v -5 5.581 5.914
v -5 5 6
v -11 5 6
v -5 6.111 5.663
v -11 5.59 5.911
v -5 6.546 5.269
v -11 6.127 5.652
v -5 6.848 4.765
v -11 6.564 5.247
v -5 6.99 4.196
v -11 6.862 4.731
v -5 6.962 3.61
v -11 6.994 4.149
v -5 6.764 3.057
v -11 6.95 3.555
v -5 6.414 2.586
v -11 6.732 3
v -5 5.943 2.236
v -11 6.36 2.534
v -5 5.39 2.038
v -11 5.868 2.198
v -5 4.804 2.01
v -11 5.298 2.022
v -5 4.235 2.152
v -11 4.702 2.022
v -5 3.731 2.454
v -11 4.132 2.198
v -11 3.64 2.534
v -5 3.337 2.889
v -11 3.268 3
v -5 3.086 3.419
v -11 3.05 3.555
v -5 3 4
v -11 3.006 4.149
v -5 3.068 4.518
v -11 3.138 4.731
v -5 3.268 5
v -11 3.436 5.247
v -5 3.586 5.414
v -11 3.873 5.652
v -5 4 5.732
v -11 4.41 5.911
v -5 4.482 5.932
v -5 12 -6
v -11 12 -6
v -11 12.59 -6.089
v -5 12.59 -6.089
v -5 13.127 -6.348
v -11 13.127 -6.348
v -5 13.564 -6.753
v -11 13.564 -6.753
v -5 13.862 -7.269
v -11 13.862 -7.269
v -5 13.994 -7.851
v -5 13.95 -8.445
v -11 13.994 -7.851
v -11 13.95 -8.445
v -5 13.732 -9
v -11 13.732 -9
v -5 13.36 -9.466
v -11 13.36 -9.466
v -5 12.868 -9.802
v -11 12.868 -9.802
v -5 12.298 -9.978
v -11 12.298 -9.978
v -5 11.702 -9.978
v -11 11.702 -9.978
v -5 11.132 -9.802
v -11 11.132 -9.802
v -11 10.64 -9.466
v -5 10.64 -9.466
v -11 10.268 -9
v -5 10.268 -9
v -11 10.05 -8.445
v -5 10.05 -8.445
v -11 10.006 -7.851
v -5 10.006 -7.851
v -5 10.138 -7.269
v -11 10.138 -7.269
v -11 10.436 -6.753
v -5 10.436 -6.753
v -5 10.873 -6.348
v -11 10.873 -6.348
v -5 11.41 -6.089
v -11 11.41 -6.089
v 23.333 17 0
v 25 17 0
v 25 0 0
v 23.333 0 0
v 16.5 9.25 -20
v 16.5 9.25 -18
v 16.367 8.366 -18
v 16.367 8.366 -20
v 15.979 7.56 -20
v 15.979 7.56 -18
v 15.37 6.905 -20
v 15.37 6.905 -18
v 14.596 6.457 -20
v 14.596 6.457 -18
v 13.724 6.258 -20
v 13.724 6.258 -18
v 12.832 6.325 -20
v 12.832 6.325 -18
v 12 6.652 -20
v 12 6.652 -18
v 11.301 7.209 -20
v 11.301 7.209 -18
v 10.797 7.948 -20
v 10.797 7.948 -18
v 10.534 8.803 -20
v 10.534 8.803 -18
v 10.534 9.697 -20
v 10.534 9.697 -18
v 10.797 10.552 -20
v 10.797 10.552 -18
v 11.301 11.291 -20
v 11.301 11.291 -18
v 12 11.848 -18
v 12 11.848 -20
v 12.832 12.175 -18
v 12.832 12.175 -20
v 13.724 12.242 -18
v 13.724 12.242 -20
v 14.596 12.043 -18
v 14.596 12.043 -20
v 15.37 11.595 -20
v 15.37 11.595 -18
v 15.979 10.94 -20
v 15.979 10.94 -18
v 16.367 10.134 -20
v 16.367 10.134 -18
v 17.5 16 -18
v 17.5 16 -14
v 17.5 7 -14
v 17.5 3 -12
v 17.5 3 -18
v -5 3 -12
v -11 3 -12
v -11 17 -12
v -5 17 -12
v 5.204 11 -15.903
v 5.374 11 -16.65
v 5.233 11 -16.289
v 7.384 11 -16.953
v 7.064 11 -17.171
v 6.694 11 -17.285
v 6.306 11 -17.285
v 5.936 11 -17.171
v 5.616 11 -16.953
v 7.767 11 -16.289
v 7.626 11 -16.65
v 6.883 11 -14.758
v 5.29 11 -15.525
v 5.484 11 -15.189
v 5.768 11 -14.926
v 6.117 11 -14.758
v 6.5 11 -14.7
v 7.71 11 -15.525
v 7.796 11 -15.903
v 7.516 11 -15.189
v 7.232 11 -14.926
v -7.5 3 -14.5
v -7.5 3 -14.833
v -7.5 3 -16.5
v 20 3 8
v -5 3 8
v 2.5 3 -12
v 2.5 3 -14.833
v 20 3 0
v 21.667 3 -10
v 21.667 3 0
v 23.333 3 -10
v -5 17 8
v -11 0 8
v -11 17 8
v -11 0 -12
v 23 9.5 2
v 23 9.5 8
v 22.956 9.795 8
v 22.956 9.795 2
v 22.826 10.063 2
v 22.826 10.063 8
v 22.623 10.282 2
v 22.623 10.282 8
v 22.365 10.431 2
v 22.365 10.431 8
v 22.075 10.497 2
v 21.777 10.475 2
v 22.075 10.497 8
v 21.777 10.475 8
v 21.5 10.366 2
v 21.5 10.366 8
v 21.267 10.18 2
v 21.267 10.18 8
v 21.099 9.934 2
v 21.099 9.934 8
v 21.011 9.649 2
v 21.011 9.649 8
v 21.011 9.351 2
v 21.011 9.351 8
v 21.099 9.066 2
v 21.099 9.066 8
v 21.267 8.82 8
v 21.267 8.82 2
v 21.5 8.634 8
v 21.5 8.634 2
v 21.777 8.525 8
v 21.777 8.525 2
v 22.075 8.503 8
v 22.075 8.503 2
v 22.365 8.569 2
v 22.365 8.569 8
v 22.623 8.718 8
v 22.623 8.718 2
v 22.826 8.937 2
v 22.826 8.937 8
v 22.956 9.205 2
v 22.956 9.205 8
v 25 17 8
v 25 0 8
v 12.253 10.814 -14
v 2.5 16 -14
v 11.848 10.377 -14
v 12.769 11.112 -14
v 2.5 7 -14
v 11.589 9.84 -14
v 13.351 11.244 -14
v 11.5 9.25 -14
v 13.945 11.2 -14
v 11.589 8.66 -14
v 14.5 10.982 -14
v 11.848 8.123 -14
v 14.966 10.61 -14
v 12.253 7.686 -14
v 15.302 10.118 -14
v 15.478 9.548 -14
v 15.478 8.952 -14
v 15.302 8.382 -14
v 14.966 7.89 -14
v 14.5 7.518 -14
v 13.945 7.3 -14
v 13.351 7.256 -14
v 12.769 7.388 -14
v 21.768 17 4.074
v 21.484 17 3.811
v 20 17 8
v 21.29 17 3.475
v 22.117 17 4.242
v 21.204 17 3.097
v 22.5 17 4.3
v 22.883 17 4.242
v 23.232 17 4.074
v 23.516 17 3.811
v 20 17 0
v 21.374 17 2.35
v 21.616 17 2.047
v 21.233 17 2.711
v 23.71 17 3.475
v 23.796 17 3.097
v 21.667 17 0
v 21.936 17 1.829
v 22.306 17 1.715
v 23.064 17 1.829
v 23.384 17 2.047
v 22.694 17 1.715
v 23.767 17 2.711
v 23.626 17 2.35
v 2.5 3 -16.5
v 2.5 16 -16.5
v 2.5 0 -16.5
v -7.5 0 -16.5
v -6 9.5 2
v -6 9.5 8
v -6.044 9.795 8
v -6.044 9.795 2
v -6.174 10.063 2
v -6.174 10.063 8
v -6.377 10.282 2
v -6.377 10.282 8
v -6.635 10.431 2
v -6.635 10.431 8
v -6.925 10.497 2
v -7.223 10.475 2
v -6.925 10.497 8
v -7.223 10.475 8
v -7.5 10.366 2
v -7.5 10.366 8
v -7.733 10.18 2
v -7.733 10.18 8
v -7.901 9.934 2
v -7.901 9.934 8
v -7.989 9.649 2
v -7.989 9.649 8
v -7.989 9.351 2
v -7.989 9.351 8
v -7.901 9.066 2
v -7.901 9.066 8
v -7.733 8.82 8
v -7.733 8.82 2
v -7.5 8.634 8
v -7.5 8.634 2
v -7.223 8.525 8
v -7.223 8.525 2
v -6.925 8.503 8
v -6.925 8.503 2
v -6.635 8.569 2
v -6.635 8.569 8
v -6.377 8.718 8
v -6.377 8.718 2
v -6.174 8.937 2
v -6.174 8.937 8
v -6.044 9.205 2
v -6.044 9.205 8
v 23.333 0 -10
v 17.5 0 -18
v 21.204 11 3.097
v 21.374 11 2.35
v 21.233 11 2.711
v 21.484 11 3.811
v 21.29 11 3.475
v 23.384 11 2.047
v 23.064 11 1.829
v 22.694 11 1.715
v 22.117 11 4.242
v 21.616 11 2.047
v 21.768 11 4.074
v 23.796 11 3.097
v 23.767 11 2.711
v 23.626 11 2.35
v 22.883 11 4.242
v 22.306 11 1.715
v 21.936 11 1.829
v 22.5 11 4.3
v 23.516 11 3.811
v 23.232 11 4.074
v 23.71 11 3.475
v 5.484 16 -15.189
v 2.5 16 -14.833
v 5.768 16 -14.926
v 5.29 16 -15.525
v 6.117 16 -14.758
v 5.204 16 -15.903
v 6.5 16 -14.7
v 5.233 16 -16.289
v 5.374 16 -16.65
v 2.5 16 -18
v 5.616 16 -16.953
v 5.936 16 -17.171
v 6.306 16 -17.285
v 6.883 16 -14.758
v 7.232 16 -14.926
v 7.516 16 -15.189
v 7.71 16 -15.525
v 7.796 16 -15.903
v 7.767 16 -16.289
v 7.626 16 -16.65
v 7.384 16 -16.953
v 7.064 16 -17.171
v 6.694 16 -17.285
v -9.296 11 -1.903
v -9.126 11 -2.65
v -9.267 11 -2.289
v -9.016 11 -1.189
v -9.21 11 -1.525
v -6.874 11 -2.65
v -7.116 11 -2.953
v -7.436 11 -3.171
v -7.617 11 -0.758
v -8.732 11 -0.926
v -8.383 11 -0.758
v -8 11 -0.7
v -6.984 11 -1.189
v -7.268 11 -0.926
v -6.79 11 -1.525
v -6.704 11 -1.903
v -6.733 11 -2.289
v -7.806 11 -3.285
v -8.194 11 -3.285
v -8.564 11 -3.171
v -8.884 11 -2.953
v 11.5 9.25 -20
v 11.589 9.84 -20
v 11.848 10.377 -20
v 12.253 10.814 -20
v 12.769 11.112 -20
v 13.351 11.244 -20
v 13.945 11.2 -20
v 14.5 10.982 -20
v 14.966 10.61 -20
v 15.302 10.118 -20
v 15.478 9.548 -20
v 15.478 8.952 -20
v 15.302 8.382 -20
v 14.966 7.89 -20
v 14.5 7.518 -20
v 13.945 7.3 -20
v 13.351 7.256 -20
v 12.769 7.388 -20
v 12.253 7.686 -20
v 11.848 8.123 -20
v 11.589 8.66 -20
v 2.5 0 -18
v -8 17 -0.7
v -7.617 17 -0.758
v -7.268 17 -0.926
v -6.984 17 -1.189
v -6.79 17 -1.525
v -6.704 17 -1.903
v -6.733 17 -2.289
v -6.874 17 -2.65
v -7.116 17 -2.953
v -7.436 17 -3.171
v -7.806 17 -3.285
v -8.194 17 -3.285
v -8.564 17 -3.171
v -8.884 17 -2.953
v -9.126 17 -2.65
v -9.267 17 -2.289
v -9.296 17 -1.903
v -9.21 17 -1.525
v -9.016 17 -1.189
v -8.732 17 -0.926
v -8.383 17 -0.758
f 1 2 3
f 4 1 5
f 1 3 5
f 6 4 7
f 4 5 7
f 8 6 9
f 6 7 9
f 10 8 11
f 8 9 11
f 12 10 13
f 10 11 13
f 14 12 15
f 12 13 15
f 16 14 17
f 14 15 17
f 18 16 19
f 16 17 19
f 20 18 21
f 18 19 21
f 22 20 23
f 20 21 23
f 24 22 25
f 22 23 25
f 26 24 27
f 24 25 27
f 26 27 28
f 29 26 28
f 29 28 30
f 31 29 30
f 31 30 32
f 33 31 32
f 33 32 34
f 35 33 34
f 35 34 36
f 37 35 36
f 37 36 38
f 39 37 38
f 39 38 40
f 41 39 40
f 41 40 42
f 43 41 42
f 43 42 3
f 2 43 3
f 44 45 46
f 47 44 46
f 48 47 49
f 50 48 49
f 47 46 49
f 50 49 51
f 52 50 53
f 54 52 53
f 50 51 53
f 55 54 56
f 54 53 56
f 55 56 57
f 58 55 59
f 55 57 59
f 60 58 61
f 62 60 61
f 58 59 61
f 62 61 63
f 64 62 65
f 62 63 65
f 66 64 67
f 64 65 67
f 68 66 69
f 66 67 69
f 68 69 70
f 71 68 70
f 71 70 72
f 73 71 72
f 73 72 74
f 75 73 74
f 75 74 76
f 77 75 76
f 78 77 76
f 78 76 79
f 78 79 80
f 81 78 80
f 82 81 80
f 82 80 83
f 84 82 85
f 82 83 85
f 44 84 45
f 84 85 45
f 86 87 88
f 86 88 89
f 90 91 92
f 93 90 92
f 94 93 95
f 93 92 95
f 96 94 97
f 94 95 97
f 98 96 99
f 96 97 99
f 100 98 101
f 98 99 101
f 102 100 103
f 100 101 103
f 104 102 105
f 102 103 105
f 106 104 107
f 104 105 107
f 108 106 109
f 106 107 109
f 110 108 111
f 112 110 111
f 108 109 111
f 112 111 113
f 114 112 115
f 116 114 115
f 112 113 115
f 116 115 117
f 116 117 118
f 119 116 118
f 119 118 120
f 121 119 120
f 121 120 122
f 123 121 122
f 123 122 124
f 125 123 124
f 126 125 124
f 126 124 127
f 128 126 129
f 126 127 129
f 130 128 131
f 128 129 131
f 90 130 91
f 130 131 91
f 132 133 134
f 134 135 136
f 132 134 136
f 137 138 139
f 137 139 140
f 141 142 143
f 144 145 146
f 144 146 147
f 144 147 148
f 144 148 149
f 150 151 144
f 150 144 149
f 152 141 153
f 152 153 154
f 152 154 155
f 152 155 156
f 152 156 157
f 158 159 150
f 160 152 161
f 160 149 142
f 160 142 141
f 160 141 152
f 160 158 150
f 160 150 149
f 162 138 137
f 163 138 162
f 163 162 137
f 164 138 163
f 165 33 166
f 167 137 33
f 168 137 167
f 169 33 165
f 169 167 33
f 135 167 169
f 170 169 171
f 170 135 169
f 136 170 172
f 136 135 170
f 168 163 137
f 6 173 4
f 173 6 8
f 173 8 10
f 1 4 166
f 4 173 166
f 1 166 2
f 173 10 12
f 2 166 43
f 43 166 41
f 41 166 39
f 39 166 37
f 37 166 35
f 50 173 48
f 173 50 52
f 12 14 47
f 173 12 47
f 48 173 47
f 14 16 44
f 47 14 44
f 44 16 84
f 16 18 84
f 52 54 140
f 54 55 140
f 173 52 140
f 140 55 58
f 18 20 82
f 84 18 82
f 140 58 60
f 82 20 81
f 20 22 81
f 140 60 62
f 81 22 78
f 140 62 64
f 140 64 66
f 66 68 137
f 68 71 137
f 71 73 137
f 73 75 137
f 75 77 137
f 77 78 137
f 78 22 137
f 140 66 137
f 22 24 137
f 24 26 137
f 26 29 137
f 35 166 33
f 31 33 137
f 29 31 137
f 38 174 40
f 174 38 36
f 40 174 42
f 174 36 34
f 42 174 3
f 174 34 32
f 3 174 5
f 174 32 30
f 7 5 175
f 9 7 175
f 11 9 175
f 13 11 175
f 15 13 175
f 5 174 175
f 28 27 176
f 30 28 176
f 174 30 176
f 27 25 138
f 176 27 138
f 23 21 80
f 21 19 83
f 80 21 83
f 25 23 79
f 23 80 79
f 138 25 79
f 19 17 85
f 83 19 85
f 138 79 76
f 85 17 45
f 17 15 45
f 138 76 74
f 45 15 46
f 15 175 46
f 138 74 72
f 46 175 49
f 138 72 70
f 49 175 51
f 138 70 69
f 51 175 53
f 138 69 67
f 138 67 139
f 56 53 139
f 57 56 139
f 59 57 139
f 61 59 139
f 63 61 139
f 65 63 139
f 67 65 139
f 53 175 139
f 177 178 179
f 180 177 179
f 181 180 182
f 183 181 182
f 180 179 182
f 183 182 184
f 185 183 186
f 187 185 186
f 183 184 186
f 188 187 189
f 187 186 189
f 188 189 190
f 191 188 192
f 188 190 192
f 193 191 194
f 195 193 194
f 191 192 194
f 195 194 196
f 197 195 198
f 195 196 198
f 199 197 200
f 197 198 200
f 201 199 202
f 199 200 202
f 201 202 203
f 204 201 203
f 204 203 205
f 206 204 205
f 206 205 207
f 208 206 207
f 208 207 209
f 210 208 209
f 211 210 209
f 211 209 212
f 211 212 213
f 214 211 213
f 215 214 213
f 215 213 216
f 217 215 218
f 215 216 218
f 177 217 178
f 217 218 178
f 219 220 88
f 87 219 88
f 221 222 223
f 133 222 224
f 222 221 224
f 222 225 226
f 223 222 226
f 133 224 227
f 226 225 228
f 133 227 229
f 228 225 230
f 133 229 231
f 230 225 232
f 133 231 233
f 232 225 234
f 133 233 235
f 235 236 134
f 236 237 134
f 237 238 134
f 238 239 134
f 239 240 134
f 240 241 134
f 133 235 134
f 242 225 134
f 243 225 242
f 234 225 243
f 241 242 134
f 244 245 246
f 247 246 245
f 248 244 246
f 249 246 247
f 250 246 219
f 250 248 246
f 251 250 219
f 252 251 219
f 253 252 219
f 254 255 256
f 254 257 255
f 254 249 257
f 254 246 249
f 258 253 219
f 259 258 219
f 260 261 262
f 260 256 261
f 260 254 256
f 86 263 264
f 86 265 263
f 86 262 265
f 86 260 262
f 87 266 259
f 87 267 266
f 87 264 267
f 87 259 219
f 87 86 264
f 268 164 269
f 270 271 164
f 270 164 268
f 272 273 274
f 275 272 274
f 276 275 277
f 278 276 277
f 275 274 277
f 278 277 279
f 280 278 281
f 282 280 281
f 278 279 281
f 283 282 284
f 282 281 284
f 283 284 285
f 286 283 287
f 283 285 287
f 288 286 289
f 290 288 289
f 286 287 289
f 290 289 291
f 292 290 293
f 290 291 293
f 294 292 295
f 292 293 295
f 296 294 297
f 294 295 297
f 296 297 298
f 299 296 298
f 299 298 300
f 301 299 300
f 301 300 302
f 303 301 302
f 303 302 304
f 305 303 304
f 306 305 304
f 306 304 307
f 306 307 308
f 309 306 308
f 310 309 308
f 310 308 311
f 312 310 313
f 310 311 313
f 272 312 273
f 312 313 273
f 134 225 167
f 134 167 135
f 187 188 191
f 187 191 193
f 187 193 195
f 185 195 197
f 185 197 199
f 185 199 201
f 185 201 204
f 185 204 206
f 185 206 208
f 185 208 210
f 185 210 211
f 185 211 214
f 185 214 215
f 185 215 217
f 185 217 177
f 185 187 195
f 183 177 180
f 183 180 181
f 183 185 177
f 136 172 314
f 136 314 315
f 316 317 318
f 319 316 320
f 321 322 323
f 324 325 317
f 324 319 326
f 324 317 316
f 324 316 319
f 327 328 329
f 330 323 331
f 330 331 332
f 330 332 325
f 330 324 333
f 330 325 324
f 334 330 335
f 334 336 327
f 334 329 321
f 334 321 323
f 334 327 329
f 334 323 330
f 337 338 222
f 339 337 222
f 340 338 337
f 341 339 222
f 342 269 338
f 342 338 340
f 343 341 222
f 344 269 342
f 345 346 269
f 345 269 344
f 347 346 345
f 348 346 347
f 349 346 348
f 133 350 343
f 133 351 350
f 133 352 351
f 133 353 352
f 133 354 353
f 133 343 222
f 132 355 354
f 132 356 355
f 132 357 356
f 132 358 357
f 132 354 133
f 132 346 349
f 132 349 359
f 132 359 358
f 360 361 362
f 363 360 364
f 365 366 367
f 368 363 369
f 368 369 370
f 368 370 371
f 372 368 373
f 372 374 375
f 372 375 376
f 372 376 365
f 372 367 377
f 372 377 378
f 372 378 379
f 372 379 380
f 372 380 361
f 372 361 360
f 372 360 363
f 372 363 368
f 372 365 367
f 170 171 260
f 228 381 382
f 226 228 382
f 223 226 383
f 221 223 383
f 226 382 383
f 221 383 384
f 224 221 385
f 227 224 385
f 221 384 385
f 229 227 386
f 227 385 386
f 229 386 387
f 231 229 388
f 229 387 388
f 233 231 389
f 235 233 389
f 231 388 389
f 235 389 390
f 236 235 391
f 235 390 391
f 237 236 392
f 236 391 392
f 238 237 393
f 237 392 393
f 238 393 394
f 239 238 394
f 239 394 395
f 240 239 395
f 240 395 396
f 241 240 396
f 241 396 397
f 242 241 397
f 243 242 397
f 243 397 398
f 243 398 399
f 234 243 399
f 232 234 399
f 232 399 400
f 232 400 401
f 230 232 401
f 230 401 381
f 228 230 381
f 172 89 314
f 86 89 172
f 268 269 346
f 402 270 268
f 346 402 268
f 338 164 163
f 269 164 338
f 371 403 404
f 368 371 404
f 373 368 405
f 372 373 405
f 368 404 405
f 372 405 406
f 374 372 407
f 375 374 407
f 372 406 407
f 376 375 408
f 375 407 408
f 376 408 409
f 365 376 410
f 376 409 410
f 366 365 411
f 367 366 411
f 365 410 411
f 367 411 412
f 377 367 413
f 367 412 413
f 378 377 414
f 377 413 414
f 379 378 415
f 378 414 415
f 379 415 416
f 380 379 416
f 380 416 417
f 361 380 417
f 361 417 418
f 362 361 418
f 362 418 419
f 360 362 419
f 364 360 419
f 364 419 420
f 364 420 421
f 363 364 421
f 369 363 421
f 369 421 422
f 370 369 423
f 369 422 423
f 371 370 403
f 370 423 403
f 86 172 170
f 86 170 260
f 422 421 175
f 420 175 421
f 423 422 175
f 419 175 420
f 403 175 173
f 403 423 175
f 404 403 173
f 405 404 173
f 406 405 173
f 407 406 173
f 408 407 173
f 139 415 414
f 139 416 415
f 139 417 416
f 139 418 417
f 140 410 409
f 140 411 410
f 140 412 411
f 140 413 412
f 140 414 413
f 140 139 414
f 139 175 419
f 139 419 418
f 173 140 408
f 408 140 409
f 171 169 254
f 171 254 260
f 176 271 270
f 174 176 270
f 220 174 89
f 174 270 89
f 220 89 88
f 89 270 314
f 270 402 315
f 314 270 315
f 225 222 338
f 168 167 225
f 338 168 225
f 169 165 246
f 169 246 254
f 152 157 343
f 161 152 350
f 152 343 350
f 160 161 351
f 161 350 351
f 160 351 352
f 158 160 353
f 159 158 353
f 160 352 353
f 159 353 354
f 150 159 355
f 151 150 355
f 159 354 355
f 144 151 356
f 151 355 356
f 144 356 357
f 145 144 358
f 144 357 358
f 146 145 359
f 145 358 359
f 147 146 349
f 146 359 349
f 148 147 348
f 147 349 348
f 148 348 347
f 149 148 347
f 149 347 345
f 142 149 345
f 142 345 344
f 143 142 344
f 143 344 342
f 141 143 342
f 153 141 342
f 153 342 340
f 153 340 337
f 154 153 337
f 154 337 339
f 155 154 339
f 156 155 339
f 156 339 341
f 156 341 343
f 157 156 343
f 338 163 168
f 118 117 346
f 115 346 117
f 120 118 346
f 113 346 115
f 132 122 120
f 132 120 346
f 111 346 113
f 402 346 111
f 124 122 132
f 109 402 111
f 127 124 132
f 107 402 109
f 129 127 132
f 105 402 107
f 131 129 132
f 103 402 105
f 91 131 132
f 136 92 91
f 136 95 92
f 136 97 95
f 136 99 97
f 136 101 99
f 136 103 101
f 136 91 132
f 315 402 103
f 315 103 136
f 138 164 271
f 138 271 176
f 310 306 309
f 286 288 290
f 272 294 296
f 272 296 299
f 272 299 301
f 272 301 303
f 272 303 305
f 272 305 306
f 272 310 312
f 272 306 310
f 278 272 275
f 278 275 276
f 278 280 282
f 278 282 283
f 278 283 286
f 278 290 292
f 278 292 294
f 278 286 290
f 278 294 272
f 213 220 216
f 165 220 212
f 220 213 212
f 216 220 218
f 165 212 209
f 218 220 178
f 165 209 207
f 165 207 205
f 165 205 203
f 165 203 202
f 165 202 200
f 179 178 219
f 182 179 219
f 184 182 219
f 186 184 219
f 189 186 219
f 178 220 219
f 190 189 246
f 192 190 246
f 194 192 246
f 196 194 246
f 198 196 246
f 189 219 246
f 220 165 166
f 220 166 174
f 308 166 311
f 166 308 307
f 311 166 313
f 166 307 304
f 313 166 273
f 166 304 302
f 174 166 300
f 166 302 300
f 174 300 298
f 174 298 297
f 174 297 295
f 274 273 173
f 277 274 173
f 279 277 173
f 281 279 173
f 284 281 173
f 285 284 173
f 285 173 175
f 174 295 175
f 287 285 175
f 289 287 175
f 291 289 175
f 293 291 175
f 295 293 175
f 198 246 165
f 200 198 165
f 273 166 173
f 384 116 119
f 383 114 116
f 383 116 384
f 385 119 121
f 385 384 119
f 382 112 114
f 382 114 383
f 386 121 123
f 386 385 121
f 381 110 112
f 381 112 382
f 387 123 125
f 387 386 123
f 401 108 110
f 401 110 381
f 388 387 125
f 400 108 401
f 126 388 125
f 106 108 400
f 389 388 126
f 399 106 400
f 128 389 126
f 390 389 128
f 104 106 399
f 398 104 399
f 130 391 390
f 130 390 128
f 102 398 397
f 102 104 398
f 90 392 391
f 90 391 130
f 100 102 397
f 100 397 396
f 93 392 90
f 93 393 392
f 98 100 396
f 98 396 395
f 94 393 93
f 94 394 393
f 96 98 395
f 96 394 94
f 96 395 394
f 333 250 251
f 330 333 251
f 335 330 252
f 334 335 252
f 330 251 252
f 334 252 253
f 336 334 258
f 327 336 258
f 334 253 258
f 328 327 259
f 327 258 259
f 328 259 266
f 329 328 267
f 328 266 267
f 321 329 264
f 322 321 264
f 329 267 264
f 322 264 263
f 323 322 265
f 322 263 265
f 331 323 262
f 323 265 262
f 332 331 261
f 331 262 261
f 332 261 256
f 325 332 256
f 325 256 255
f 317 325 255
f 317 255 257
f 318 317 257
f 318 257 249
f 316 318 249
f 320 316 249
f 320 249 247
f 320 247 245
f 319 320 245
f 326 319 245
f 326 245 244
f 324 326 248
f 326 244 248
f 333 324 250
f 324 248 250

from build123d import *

# Parameters (mm, degrees)
SKETCH1_W           = 50
SKETCH1_H           = 36
BOSS_EXTRUDE1_DEPTH = 3
SKETCH2_W           = 5
SKETCH2_H           = 8
SKETCH2_W_2         = 6
SKETCH2_H_2         = 20
BOSS_EXTRUDE2_DEPTH = 14
SKETCH3_W           = 15
SKETCH3_H           = 4
BOSS_EXTRUDE3_DEPTH = 13
SKETCH4_R           = 3
BOSS_EXTRUDE4_DEPTH = 2
SKETCH5_R           = 2
CUT_EXTRUDE1_DEPTH  = 12
CUT_EXTRUDE2_DEPTH  = 11
SKETCH7_W           = 1.666666666
SKETCH7_H           = 10
BOSS_EXTRUDE5_DEPTH = 14
CUT_EXTRUDE3_REACH  = 45.218
CUT_EXTRUDE4_REACH  = 36.943
SKETCH10_W          = 10
SKETCH10_H          = 1.666666667
BOSS_EXTRUDE7_DEPTH = 13
CUT_EXTRUDE5_DEPTH  = 2
SKETCH12_R          = 2
CUT_EXTRUDE6_DEPTH  = 6
CHAMFER1_SIZE       = 2
CHAMFER1_SIZE2      = 4
CUT_EXTRUDE7_DEPTH  = 5
SKETCH14_R          = 1.3
CUT_EXTRUDE8_DEPTH  = 6
SKETCH15_R          = 1
CUT_EXTRUDE9_DEPTH  = 6


with BuildPart() as part:
    # Sketch1 → Boss-Extrude1 (new body)
    with BuildSketch(Plane(origin=(0, 0, 0), x_dir=(1, 0, 0), z_dir=(0, 1, 0))):
        Rectangle(SKETCH1_W, SKETCH1_H)
    extrude(amount=BOSS_EXTRUDE1_DEPTH)

    # Sketch2 → Boss-Extrude2 (add)
    with BuildSketch(Plane(origin=(0, 3, 0), x_dir=(1, 0, 0), z_dir=(0, 1, 0))):
        with Locations((22.5, -4)):
            Rectangle(SKETCH2_W, SKETCH2_H)
        with Locations((-8, 2)):
            Rectangle(SKETCH2_W_2, SKETCH2_H_2)
    extrude(amount=BOSS_EXTRUDE2_DEPTH)

    # Sketch3 → Boss-Extrude3 (add)
    with BuildSketch(Plane(origin=(0, 3, 0), x_dir=(1, 0, 0), z_dir=(0, 1, 0))):
        with Locations((10, 16)):
            Rectangle(SKETCH3_W, SKETCH3_H)
    extrude(amount=BOSS_EXTRUDE3_DEPTH)

    # Sketch4 → Boss-Extrude4 (add)
    with BuildSketch(Plane(origin=(0, 0, -18), x_dir=(-1, 0, 0), z_dir=(0, 0, -1))):
        with Locations(Location((-13.5, 9.25, 0), (0, 0, 180))):
            Circle(SKETCH4_R)
    extrude(amount=BOSS_EXTRUDE4_DEPTH)

    # Sketch5 → Cut-Extrude1 (cut)
    with BuildSketch(Plane(origin=(0, 0, -20), x_dir=(-1, 0, 0), z_dir=(0, 0, -1))):
        with Locations((-13.5, 9.25)):
            Circle(SKETCH5_R)
    extrude(amount=-CUT_EXTRUDE1_DEPTH, mode=Mode.SUBTRACT)

    # Sketch6 → Cut-Extrude2 (cut)
    with BuildSketch(Plane(origin=(0, 3, 0), x_dir=(1, 0, 0), z_dir=(0, 1, 0))):
        Polygon((-11, 12), (-11, 18), (-25, 18), (-25, -18), (25, -18), (25, -8), (-11, -8), align=None)
    extrude(amount=-CUT_EXTRUDE2_DEPTH, mode=Mode.SUBTRACT)

    # Sketch7 → Boss-Extrude5 (add)
    with BuildSketch(Plane(origin=(0, 17, 0), x_dir=(1, 0, 0), z_dir=(0, 1, 0))):
        with Locations((22.5, 5)):
            Rectangle(SKETCH7_W, SKETCH7_H)
    extrude(amount=-BOSS_EXTRUDE5_DEPTH)

    # Sketch8 → Cut-Extrude3 (cut, up to next)
    with BuildSketch(Plane(origin=(23.333333333, 0, 0), x_dir=(0, 0, -1), z_dir=(1, 0, 0)), mode=Mode.PRIVATE) as cut_extrude3_sk1:
        Polygon((10, 3), (0, 17), (10, 17), align=None)
    cut_extrude3_tool1 = extrude(cut_extrude3_sk1.sketch, amount=-CUT_EXTRUDE3_REACH, mode=Mode.PRIVATE) & part.part
    add(cut_extrude3_tool1.solids().sort_by_distance((23.333333, 12.333333, -6.666667))[0], mode=Mode.SUBTRACT)

    # Sketch9 → Cut-Extrude4 (cut, up to next)
    with BuildSketch(Plane(origin=(0, 3, 0), x_dir=(1, 0, 0), z_dir=(0, 1, 0)), mode=Mode.PRIVATE) as cut_extrude4_sk1:
        Polygon((25, 0), (23.333333333, 0), (23.333333333, 10), (17.5, 18), (25, 18), align=None)
    cut_extrude4_tool1 = extrude(cut_extrude4_sk1.sketch, amount=-CUT_EXTRUDE4_REACH, mode=Mode.PRIVATE) & part.part
    add(cut_extrude4_tool1.solids().sort_by_distance((22.951389, 3, -11.770833))[0], mode=Mode.SUBTRACT)

    # Sketch10 → Boss-Extrude7 (add)
    with BuildSketch(Plane(origin=(0, 3, 0), x_dir=(1, 0, 0), z_dir=(0, 1, 0))):
        with Locations((-2.5, 15.666666666)):
            Rectangle(SKETCH10_W, SKETCH10_H)
    extrude(amount=BOSS_EXTRUDE7_DEPTH)

    # Sketch11 → Cut-Extrude5 (cut)
    with BuildSketch(Plane(origin=(0, 0, -16.5), x_dir=(-1, 0, 0), z_dir=(0, 0, -1))):
        Polygon((7.5, 3), (-2.5, 16), (7.5, 16), align=None)
    extrude(amount=-CUT_EXTRUDE5_DEPTH, mode=Mode.SUBTRACT)

    # Sketch12 → Cut-Extrude6 (cut)
    with BuildSketch(Plane.ZY.offset(11)):
        with Locations((4, 5)):
            Circle(SKETCH12_R)
        with Locations((-8, 12)):
            Circle(SKETCH12_R)
    extrude(amount=-CUT_EXTRUDE6_DEPTH, mode=Mode.SUBTRACT)

    # Chamfer1
    chamfer1_edges = [part.edges().sort_by_distance(p)[0] for p in [
        (10, 3, -14),
    ]]
    chamfer1_side = [part.faces().sort_by_distance(p)[0] for p in [
        (7.078272128, 3, -4.239053672),
    ]]
    chamfer(chamfer1_edges, length=CHAMFER1_SIZE, length2=CHAMFER1_SIZE2, reference=chamfer1_side[0])

    # Sketch13 → Cut-Extrude7 (cut)
    with BuildSketch(Plane(origin=(0, 3, 0), x_dir=(1, 0, 0), z_dir=(0, 1, 0))):
        Polygon((-7.5, 16.5), (-11, 12), (-11, 18), (2.5, 18), (2.5, 16.5), align=None)
    extrude(amount=-CUT_EXTRUDE7_DEPTH, mode=Mode.SUBTRACT)

    # Sketch14 → Cut-Extrude8 (cut)
    with BuildSketch(Plane(origin=(0, 17, 0), x_dir=(1, 0, 0), z_dir=(0, 1, 0))):
        with Locations(Location((6.5, 16, 0), (0, 0, 270))):
            Circle(SKETCH14_R)
        with Locations(Location((-8, 2, 0), (0, 0, 270))):
            Circle(SKETCH14_R)
        with Locations(Location((22.5, -3, 0), (0, 0, 270))):
            Circle(SKETCH14_R)
    extrude(amount=-CUT_EXTRUDE8_DEPTH, mode=Mode.SUBTRACT)

    # Sketch15 → Cut-Extrude9 (cut)
    with BuildSketch(Plane.XY.offset(8)):
        with Locations((-7, 9.5)):
            Circle(SKETCH15_R)
        with Locations((22, 9.5)):
            Circle(SKETCH15_R)
    extrude(amount=-CUT_EXTRUDE9_DEPTH, mode=Mode.SUBTRACT)


solid = part.part
